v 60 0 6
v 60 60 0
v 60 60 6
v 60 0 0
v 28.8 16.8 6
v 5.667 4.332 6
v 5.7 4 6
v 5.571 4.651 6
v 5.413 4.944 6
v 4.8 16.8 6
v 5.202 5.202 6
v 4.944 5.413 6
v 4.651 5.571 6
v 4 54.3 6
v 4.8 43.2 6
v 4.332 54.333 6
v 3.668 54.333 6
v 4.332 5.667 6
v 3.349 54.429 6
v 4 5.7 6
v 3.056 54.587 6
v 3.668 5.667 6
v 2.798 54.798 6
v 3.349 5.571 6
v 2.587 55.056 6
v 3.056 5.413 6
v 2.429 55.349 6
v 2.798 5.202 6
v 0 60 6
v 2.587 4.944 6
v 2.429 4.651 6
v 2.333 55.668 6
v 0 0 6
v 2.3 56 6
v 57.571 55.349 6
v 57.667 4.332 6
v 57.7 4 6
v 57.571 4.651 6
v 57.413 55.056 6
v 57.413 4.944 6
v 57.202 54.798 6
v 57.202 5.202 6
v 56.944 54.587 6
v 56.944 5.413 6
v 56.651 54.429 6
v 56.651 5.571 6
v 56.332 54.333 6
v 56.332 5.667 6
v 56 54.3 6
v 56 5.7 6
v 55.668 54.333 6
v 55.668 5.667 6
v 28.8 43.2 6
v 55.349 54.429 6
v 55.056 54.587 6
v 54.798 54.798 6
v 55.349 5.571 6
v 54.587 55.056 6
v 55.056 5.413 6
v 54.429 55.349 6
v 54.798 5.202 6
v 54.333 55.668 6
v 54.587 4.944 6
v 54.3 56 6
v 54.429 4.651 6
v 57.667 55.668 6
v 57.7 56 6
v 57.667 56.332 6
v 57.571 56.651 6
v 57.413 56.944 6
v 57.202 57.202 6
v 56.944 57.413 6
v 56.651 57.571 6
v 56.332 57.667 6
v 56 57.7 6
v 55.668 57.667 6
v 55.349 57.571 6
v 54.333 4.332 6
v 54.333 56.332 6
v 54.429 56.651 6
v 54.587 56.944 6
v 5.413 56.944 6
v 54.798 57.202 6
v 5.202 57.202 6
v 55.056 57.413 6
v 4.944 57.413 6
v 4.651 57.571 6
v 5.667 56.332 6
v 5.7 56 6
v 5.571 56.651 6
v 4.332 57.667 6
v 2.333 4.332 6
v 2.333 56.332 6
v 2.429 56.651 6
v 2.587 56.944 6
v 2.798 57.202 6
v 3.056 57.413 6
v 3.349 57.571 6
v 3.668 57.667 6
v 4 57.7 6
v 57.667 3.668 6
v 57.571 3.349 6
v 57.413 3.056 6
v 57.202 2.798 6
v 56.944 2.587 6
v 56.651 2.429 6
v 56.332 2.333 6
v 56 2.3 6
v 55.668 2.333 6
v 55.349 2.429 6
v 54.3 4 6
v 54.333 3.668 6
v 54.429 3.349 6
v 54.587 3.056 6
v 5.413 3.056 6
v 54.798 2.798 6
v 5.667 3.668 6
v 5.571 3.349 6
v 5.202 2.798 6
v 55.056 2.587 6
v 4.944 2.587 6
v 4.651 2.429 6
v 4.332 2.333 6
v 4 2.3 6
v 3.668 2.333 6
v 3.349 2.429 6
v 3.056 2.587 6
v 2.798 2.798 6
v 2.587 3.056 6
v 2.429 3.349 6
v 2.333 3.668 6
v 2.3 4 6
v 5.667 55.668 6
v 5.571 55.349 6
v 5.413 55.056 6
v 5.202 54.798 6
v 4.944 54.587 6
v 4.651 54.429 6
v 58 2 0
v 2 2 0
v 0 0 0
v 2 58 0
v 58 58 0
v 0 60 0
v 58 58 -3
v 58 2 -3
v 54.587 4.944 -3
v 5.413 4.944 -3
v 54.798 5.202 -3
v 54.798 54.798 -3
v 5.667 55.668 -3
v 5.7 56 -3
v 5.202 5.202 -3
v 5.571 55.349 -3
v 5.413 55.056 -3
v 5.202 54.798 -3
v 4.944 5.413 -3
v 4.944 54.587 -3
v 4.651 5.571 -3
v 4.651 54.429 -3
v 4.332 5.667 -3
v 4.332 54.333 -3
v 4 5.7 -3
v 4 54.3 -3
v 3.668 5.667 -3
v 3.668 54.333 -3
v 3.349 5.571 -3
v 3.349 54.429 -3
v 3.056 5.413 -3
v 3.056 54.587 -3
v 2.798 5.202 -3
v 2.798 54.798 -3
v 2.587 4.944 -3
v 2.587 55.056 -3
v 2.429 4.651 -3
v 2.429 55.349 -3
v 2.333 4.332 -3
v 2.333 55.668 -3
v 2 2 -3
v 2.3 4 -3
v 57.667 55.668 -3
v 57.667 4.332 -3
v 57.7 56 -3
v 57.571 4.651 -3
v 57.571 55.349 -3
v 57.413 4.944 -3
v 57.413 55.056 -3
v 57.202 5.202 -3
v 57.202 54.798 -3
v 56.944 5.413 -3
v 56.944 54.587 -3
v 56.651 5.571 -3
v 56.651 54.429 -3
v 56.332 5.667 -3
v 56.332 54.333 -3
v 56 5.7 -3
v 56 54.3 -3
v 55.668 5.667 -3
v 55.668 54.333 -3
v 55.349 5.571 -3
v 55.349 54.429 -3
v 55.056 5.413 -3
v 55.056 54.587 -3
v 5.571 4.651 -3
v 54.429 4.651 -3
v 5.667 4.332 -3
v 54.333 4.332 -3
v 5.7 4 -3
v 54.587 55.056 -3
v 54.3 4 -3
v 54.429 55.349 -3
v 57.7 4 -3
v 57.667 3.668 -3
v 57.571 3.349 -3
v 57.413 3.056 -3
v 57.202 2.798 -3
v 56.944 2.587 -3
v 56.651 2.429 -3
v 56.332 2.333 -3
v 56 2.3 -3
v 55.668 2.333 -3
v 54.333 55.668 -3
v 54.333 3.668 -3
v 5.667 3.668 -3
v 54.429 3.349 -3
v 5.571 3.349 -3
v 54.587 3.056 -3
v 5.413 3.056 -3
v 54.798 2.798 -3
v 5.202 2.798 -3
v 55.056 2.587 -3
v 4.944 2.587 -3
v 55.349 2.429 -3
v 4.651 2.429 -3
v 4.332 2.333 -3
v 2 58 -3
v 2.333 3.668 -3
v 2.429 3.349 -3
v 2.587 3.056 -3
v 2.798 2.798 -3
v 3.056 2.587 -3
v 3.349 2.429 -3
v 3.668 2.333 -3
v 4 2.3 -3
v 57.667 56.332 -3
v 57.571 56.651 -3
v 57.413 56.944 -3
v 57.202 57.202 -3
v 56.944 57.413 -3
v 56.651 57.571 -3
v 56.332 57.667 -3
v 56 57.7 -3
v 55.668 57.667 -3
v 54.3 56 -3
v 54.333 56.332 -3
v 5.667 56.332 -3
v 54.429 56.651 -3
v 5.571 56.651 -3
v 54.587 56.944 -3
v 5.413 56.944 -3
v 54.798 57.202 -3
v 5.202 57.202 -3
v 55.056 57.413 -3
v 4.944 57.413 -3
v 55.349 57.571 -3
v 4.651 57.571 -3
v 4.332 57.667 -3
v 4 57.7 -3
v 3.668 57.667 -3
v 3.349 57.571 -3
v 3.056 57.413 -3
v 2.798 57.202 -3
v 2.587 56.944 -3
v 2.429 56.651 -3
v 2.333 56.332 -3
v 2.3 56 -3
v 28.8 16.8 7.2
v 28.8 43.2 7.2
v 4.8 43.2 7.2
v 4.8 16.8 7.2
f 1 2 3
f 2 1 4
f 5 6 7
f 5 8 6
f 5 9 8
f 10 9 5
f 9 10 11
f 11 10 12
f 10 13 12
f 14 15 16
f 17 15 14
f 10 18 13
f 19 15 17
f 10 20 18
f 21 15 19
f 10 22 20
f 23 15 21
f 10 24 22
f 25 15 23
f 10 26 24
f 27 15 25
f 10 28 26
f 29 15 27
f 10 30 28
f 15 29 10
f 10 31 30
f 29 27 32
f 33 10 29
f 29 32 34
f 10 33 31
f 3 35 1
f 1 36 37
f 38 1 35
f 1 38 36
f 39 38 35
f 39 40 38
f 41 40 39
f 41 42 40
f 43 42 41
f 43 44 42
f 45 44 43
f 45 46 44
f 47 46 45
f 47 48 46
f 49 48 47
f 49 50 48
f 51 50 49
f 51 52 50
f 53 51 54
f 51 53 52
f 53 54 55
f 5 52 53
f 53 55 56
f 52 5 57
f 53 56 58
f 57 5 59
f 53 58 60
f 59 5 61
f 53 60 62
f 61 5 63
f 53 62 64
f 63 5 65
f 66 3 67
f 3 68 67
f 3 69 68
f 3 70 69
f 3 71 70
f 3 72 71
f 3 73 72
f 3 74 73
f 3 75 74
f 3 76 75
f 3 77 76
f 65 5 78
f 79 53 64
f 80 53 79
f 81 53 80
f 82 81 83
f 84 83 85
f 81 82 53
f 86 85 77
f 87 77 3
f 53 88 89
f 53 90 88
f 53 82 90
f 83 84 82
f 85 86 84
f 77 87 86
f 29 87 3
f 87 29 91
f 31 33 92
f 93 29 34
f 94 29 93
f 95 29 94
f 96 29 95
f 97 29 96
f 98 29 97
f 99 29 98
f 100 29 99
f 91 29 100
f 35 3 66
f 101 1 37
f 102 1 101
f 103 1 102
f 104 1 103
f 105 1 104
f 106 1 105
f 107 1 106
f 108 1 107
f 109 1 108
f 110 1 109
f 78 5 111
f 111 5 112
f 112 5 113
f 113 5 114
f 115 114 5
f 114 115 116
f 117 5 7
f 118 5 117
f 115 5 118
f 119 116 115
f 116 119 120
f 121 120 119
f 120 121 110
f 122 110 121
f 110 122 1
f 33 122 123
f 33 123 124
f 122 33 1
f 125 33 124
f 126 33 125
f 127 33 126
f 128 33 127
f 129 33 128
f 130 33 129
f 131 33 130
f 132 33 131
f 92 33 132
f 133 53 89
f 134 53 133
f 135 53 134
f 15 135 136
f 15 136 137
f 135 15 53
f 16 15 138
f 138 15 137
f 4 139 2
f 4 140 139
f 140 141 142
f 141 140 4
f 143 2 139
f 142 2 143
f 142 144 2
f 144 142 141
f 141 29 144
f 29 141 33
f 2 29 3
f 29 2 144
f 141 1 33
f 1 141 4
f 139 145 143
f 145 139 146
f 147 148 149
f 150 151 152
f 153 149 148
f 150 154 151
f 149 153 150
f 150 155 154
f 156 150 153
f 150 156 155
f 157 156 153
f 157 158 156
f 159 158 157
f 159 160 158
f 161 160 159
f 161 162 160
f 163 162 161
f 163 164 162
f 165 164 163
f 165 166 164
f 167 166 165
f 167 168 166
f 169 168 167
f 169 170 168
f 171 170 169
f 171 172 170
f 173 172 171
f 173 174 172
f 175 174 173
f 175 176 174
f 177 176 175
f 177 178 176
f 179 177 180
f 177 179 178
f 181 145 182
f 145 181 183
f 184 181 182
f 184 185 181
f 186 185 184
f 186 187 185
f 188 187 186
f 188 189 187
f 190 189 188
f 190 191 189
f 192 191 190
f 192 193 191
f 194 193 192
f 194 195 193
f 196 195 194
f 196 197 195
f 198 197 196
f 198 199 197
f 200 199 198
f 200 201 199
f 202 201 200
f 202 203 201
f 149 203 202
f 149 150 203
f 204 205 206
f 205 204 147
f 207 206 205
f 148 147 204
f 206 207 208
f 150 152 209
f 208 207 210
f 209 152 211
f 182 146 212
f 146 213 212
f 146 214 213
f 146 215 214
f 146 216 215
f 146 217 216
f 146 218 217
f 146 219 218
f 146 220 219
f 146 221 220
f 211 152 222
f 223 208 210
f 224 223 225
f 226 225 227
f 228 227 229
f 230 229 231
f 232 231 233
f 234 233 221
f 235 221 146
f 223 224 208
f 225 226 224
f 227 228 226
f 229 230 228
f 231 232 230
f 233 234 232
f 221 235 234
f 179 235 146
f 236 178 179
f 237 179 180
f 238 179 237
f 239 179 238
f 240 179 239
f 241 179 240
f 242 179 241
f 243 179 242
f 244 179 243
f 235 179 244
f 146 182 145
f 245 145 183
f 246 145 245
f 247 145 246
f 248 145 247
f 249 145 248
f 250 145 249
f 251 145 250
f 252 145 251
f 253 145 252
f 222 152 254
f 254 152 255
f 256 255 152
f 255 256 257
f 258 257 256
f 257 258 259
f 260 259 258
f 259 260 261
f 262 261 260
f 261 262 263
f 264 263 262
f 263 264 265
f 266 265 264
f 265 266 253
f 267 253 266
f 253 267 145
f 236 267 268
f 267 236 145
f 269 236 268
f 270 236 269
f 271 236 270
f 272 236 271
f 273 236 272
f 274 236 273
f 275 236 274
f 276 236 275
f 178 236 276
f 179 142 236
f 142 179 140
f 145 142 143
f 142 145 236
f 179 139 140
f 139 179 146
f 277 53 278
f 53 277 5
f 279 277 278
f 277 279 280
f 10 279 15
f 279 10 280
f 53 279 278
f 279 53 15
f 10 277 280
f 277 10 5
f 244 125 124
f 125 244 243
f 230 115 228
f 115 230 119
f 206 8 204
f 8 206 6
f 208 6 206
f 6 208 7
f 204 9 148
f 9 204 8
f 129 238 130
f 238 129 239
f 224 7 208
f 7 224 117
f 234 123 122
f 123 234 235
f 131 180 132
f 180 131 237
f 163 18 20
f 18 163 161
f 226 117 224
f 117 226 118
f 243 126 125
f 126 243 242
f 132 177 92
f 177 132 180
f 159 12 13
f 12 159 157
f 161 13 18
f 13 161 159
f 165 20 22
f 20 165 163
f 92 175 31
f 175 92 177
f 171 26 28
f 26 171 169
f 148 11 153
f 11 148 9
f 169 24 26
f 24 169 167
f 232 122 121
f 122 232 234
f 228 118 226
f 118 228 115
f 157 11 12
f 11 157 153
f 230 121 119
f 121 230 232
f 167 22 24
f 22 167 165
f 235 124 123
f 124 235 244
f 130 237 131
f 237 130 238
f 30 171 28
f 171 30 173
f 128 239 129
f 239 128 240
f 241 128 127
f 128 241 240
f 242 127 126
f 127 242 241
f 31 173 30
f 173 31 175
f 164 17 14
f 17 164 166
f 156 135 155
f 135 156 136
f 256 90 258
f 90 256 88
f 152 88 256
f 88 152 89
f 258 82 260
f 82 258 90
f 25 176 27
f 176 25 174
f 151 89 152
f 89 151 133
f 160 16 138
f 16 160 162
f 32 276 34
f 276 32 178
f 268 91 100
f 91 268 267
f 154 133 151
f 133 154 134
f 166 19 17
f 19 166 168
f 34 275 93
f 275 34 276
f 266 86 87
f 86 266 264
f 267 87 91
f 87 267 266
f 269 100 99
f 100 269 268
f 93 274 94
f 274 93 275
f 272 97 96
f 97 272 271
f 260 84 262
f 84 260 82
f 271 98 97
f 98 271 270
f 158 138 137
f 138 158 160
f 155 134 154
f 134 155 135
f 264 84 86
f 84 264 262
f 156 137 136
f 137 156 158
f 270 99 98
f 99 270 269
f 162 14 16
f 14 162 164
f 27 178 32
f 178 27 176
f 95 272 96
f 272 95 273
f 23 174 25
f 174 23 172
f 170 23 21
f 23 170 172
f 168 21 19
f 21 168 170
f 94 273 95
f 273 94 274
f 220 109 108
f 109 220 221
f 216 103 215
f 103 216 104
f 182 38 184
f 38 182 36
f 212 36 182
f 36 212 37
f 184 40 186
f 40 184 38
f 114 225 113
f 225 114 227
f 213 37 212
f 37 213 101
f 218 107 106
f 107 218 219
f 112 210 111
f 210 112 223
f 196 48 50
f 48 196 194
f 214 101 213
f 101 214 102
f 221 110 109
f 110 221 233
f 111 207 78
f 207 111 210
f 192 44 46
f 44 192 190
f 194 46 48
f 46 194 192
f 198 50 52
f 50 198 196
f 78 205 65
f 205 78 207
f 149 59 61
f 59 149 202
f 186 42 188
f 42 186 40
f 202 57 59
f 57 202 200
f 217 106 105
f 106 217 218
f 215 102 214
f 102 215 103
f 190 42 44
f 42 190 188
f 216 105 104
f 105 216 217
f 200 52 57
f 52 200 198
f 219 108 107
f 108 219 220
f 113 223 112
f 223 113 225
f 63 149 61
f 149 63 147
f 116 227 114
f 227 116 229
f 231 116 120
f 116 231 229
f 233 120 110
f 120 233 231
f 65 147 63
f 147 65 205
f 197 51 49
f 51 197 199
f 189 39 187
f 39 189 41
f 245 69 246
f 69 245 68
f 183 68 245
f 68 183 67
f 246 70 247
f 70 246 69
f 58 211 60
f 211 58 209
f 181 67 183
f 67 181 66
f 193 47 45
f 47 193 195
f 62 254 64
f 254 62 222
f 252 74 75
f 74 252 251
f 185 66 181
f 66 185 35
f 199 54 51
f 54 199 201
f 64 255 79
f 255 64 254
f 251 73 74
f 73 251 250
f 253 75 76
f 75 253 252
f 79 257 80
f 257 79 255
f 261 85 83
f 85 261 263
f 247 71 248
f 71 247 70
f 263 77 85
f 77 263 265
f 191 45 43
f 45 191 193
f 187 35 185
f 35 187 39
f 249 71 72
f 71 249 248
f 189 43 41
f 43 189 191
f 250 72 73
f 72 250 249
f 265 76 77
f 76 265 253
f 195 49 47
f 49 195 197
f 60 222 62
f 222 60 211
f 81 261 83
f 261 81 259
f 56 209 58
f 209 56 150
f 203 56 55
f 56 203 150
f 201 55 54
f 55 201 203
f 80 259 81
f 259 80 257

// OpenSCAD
$fn = 32;

// ----------------------------------------------------------------------
// Enclosure lid: 60 x 60 x 6 mm, 4 bolt holes
// ----------------------------------------------------------------------

// --- parameters (mm) ---
length = 60;              // lid length, X
width = 60;               // lid width, Y
plate_t = 6;              // lid plate thickness
bolt_d = 3.4;             // bolt clearance
boss_lip = 4;             // bolt hole inset from the corner
sink = 1;                 // overlap of the lip and ribs into the plate
lip_h = 4;                // lip height below the plate
lip_wall = 2;             // lip wall thickness
label_h = 1.2;            // raised marking pad

module plate() {
  cube([length, width, plate_t]);
  /* lip that drops into the housing opening, sunk into the plate */
  translate([lip_wall, lip_wall, -lip_h + sink]) cube([length - 2 * lip_wall, width - 2 * lip_wall, lip_h]);
  /* raised marking pad on top, sunk 1 mm into the plate */
  translate([length * 0.08, width * 0.28, plate_t - 1]) cube([length * 0.4, width * 0.44, label_h + 1]);
}

difference() {
  plate();
  /* bolt pattern matching the corner bosses */
  for (sx = [0, 1]) for (sy = [0, 1])
    translate([sx * (length - 2 * boss_lip) + boss_lip, sy * (width - 2 * boss_lip) + boss_lip, -lip_h - 1])
      cylinder(h = plate_t + lip_h + 2, d = bolt_d);
}
